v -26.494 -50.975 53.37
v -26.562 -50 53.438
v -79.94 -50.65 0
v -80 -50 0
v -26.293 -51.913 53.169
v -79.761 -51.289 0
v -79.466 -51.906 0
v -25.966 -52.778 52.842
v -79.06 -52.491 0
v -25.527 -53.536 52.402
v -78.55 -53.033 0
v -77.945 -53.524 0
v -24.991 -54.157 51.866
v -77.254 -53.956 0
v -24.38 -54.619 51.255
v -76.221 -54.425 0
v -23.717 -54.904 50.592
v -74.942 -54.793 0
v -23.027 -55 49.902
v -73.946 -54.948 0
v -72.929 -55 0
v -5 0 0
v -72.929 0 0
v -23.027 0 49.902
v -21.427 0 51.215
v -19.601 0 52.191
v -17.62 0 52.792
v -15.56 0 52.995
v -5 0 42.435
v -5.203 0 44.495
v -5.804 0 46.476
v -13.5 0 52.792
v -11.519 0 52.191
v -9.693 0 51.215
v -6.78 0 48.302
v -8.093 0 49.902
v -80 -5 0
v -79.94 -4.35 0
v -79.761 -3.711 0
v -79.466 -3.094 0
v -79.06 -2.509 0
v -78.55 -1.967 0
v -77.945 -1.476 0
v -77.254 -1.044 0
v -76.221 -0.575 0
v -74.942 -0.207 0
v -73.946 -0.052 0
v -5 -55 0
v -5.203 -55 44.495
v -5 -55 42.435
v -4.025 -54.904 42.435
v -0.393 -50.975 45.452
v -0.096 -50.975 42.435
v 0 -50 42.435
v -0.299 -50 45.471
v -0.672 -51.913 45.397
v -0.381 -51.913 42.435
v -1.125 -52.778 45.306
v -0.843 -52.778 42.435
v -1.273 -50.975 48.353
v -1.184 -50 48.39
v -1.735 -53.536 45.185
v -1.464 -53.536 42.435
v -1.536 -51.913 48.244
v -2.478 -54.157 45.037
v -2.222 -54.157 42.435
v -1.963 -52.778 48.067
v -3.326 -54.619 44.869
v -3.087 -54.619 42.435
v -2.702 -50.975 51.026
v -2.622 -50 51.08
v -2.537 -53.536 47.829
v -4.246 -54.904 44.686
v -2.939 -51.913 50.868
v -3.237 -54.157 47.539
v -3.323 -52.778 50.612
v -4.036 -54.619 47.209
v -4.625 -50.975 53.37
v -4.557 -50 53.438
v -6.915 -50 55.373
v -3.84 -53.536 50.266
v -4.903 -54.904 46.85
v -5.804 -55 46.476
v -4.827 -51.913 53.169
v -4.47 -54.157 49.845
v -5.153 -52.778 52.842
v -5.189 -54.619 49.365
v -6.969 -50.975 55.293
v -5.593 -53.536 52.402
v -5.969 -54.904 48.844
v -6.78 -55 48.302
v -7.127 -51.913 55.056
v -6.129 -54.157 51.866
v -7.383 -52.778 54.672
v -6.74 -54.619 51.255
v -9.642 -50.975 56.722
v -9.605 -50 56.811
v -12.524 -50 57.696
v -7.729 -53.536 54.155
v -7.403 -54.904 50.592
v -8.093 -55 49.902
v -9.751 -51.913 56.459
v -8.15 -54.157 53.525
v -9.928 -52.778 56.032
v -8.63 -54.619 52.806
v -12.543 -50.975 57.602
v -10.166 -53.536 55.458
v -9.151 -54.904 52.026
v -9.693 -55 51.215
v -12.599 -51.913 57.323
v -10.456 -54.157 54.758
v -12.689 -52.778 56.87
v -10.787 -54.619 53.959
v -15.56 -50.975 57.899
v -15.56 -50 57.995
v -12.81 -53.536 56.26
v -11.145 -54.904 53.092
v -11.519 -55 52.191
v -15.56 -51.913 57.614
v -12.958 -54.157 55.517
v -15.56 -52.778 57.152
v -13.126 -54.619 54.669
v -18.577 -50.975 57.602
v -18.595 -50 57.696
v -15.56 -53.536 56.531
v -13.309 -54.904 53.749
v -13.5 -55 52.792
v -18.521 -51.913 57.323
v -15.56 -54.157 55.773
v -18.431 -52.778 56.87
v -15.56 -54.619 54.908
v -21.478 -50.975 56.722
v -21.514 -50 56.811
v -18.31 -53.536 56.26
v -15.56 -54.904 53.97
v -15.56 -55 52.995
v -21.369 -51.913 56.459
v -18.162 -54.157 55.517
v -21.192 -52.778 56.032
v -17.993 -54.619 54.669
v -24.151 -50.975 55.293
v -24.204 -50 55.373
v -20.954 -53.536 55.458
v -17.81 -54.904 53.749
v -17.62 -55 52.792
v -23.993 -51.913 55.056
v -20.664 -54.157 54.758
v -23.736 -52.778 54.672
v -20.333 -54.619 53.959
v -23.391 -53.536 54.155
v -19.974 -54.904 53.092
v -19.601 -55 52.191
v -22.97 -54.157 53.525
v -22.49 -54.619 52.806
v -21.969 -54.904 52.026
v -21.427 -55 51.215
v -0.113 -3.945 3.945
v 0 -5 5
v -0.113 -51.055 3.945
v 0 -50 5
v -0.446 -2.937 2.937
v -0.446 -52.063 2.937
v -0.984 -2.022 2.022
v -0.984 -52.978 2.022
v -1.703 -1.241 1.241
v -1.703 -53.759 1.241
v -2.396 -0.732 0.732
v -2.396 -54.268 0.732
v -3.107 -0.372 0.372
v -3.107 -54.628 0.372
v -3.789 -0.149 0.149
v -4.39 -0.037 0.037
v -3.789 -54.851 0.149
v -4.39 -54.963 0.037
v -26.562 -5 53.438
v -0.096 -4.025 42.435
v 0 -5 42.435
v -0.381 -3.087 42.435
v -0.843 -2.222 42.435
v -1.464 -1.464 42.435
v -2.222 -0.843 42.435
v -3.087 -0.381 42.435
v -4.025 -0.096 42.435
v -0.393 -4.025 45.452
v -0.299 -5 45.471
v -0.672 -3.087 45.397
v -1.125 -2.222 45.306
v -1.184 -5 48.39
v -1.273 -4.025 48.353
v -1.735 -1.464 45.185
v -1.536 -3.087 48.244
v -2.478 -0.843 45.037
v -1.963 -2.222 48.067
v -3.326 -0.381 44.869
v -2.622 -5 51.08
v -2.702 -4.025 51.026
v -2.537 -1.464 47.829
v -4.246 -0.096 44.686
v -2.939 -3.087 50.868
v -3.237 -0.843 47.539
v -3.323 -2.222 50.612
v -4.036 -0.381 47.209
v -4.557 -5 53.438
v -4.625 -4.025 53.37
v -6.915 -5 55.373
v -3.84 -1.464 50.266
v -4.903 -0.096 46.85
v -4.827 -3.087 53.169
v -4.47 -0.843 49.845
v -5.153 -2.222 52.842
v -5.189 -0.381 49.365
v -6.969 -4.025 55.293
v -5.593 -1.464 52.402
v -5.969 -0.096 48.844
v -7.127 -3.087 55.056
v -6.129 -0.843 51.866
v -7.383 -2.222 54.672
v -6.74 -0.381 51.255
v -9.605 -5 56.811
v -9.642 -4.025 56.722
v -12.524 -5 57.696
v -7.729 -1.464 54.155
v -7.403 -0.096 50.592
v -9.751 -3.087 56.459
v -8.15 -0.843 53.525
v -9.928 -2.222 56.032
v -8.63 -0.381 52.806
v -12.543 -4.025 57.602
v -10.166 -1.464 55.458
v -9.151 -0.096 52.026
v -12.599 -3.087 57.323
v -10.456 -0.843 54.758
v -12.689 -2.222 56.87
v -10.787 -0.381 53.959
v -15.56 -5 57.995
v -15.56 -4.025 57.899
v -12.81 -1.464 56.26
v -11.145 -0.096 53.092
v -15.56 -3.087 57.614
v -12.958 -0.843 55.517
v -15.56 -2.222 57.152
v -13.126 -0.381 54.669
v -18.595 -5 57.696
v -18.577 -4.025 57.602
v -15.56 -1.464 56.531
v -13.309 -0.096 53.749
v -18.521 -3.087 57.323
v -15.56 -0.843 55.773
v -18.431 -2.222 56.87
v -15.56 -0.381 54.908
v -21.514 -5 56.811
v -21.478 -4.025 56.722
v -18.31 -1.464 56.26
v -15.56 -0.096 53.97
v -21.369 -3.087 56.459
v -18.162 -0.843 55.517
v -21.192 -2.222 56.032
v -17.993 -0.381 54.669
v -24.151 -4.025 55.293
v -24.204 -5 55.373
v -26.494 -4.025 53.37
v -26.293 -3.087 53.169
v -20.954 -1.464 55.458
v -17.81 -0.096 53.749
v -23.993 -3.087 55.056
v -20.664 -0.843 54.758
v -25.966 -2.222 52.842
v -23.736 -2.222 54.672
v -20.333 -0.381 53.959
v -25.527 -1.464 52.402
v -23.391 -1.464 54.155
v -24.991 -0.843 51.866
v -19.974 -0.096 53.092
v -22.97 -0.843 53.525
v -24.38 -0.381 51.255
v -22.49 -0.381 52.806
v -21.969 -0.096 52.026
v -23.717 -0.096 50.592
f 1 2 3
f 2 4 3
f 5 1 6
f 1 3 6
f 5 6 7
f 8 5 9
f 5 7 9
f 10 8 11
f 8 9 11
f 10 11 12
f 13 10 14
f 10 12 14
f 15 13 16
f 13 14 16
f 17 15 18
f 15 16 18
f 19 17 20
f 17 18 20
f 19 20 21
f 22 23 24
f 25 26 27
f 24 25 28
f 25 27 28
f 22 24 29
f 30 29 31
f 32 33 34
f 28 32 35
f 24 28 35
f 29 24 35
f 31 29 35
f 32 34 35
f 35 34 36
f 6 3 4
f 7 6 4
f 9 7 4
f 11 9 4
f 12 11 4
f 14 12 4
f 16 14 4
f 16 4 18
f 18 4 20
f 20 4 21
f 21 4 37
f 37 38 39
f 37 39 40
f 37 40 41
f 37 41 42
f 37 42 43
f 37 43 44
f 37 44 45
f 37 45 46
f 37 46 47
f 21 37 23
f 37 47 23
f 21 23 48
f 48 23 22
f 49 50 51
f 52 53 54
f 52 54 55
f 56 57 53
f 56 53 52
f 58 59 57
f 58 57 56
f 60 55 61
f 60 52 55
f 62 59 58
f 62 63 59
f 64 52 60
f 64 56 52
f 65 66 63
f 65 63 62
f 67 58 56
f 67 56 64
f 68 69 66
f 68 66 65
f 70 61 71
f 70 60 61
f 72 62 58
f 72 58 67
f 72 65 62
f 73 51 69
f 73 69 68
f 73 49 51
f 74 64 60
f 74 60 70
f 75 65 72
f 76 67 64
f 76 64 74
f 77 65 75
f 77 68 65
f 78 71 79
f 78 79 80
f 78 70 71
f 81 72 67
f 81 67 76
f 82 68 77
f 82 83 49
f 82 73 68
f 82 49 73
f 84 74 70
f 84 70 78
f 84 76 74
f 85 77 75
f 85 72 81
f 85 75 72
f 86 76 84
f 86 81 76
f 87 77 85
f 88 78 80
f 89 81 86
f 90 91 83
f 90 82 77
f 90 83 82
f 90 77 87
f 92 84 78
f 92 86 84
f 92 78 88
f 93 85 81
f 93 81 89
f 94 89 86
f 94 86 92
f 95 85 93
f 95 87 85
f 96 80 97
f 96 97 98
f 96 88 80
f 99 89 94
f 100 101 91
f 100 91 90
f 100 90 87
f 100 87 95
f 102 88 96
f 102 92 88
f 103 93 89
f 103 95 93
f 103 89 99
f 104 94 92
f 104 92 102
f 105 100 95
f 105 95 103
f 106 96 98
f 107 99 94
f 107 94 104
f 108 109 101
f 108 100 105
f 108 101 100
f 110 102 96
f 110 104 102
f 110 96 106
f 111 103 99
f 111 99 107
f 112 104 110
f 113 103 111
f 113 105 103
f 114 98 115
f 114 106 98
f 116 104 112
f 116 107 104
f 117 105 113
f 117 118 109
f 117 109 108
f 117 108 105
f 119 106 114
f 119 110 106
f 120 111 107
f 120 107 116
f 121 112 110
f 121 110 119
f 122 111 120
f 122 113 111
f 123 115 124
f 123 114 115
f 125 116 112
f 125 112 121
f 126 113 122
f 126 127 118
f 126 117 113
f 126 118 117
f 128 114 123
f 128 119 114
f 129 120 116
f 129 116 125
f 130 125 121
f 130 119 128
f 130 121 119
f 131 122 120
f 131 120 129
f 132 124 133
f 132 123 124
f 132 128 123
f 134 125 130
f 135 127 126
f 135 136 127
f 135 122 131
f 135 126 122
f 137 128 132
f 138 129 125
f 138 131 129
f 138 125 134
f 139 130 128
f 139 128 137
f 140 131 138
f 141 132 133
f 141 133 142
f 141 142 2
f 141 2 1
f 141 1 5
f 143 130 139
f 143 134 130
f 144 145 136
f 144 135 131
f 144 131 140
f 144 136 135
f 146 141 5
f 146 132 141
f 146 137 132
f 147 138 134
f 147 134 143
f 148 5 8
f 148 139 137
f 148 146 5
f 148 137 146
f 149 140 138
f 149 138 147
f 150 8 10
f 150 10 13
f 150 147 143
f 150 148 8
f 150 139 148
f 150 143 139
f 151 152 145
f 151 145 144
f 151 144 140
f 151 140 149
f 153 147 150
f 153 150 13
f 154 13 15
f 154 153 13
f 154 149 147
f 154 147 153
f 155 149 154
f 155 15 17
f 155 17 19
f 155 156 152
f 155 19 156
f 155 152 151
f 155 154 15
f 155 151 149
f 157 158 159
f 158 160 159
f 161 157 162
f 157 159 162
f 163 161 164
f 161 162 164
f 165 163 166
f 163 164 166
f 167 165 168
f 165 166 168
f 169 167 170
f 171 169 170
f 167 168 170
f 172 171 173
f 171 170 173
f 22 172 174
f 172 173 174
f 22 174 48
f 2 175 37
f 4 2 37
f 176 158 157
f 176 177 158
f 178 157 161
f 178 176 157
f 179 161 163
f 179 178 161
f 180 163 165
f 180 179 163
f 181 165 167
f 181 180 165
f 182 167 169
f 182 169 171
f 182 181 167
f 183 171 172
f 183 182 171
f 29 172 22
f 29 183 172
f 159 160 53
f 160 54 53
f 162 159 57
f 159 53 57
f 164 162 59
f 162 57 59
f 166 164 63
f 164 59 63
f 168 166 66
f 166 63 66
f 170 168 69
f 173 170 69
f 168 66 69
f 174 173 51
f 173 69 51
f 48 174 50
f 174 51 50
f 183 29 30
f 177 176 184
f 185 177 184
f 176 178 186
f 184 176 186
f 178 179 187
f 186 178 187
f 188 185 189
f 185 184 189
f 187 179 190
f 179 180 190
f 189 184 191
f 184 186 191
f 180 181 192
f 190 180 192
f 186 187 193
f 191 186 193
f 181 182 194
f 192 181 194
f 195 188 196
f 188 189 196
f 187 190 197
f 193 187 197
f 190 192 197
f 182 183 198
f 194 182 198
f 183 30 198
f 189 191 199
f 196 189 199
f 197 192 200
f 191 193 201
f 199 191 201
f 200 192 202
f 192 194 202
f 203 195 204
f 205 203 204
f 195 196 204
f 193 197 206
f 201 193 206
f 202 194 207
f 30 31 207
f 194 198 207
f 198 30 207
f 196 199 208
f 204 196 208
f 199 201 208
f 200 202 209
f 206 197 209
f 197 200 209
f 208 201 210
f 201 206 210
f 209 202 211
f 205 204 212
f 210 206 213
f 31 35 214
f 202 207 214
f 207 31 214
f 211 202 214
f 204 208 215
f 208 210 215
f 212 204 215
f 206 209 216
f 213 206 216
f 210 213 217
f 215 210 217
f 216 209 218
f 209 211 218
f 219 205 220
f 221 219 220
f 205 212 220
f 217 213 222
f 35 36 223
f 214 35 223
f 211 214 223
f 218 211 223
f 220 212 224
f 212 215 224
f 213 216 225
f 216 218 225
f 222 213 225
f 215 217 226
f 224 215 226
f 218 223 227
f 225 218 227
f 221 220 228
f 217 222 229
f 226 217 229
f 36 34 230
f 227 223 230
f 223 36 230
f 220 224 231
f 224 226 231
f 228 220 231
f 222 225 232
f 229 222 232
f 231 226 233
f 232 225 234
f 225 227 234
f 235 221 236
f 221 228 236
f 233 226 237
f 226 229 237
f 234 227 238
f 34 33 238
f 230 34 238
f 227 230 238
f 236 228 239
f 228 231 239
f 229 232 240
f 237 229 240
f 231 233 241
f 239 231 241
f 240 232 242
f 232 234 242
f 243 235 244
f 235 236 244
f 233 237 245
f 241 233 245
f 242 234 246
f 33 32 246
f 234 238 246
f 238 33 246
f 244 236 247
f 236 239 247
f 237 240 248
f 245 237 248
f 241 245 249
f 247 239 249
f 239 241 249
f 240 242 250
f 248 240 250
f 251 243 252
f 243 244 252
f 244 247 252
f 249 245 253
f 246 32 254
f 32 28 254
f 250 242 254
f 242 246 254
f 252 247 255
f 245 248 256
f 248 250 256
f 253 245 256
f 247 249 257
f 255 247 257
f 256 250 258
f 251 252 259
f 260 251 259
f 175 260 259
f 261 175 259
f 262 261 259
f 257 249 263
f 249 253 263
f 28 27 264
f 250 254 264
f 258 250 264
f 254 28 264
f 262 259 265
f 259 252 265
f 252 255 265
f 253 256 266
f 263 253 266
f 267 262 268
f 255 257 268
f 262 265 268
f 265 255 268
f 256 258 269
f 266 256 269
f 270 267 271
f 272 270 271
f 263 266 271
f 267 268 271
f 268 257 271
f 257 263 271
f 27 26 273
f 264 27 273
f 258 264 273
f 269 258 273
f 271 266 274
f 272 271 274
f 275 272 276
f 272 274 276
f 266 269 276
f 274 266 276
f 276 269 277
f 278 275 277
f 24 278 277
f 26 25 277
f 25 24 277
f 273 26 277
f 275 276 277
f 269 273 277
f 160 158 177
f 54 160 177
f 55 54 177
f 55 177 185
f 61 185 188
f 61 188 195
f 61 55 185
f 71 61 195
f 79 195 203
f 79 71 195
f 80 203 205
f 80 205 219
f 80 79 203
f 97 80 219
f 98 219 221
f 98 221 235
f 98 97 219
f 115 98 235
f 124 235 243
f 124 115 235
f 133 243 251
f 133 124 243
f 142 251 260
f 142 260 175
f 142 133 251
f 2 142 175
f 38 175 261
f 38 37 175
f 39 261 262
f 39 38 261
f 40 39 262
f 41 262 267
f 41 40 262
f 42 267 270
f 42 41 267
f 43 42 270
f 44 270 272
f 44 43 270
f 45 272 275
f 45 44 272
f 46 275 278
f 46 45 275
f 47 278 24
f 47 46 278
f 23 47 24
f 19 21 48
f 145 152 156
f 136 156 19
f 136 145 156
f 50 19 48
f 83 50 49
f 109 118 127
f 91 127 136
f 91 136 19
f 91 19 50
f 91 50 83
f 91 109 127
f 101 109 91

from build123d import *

# Parameters (mm, degrees)
F1_DEPTH = 55
F2_R     = 15.559852
F3_R     = 5


with BuildPart() as f1:
    # F0 (on Front) → F1 (new body)
    with BuildSketch(Plane.XZ):
        Polygon((-80, 0), (0, 0), (0, 80), align=None)
    extrude(amount=F1_DEPTH)

    # F2
    f2_edges = [f1.edges().sort_by_distance(p)[0] for p in [
        (0, -27.5, 80),
    ]]
    fillet(f2_edges, radius=F2_R)

    # F3
    f3_edges = [f1.edges().sort_by_distance(p)[0] for p in [
        (0, -55, 21.217598),
        (0, 0, 21.217598),
        (0, -27.5, 0),
    ]]
    fillet(f3_edges, radius=F3_R)


solid = f1.part
